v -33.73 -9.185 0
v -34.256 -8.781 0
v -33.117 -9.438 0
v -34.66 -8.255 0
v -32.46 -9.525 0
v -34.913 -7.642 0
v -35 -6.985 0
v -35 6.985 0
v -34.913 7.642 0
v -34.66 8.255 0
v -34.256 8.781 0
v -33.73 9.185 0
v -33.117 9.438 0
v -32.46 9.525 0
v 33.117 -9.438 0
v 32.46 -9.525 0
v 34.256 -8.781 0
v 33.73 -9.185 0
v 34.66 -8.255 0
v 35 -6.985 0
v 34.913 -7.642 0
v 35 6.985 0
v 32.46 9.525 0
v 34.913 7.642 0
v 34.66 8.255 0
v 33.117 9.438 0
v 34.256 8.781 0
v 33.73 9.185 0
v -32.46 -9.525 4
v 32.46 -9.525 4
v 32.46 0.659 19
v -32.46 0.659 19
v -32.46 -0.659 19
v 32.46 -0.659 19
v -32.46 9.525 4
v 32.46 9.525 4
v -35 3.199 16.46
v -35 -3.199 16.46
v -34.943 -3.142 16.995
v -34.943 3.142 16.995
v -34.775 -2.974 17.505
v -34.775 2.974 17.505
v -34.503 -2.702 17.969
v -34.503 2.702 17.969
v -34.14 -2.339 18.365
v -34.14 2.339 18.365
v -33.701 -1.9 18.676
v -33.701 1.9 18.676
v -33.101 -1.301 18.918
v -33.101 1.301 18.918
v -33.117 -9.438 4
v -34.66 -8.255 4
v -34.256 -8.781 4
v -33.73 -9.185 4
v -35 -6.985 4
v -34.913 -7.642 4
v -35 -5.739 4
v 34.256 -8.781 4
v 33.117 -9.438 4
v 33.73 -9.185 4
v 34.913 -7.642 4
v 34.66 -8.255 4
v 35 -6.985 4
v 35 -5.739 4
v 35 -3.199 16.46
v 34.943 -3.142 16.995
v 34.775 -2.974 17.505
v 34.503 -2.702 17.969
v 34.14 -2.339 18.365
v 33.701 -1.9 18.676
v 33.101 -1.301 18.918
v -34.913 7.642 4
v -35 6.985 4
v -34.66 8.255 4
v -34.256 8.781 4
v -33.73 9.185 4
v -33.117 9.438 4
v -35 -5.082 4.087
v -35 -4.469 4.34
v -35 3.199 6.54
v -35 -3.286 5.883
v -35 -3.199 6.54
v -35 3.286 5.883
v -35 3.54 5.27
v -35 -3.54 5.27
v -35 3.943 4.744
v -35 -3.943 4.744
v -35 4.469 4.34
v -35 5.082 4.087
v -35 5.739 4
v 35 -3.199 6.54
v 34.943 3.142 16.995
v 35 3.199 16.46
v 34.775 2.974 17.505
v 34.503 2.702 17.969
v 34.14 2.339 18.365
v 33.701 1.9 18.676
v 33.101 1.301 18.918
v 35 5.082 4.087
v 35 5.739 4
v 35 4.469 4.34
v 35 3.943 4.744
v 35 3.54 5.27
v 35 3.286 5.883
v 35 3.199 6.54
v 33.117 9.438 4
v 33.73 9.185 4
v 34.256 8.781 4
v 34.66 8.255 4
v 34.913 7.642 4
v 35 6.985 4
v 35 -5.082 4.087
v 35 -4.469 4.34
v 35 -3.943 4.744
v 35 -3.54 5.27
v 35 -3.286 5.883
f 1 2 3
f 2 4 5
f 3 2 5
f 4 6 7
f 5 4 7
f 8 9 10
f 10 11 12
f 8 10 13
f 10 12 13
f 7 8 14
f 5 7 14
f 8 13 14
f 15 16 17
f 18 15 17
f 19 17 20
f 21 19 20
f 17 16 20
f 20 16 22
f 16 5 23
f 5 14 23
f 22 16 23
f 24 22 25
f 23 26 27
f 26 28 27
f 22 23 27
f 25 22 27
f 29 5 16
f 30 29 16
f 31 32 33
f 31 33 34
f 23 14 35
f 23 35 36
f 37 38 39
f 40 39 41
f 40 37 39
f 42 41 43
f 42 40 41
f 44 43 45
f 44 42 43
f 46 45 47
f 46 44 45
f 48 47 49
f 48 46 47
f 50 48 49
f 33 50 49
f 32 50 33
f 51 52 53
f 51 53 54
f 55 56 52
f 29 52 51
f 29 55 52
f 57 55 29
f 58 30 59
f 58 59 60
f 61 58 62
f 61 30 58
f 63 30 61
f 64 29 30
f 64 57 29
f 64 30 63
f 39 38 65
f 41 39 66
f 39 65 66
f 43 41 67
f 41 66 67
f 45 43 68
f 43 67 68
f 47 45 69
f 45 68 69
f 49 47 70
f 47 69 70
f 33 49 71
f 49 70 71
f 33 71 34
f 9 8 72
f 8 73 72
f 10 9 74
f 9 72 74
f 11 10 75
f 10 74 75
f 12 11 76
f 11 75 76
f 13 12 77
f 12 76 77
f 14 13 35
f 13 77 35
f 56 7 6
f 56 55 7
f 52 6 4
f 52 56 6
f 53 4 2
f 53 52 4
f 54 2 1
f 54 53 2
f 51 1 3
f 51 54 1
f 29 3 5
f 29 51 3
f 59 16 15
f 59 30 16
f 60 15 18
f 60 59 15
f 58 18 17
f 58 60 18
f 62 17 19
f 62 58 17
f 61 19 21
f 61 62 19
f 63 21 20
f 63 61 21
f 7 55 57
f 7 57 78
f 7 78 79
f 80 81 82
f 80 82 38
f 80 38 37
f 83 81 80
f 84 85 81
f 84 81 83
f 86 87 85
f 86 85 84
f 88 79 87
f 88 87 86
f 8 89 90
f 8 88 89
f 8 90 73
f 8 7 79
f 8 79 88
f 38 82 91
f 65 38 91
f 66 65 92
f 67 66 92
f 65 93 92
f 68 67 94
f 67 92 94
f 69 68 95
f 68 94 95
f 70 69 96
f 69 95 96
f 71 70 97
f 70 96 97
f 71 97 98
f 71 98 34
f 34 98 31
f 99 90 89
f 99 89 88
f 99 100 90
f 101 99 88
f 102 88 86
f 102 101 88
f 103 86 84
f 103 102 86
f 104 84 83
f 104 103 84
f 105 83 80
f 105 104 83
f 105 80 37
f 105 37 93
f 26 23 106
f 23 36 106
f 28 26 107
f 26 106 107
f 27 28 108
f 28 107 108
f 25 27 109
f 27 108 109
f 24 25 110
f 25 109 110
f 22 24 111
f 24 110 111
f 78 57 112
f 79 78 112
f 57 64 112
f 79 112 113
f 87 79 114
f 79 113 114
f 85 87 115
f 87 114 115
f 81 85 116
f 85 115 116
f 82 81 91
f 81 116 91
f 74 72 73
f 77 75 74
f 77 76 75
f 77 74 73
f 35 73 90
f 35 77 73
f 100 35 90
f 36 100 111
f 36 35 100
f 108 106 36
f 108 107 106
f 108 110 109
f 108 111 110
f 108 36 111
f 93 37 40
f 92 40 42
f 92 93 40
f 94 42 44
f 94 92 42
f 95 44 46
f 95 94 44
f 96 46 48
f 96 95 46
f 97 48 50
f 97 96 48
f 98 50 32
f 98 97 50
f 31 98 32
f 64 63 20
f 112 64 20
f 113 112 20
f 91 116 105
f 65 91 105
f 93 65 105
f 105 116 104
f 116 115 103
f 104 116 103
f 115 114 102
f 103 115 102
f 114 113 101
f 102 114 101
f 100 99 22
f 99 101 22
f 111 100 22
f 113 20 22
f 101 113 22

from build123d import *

# Parameters (mm, degrees)
SKETCH1_W           = 70
SKETCH1_H           = 19.05
BOSS_EXTRUDE1_DEPTH = 4
SKETCH2_W           = 70
SKETCH2_H           = 6.398717948
BOSS_EXTRUDE2_DEPTH = 15
FILLET1_R           = 2.54


with BuildPart() as part:
    # Sketch1 → Boss-Extrude1 (new body)
    with BuildSketch(Plane.XY):
        Rectangle(SKETCH1_W, SKETCH1_H)
    extrude(amount=BOSS_EXTRUDE1_DEPTH)

    # Sketch2 → Boss-Extrude2 (add)
    with BuildSketch(Plane.XY.offset(4)):
        Rectangle(SKETCH2_W, SKETCH2_H)
    extrude(amount=BOSS_EXTRUDE2_DEPTH)

    # Fillet1
    fillet1_edges = [part.edges().sort_by_distance(p)[0] for p in [
        (0, 3.199358974, 4),
        (0, -3.199358974, 4),
        (35, 0, 19),
        (0, 3.199358974, 19),
        (-35, 0, 19),
        (0, -3.199358974, 19),
        (35, -9.525, 2),
        (-35, -9.525, 2),
        (-35, 9.525, 2),
        (35, 9.525, 2),
    ]]
    fillet(fillet1_edges, radius=FILLET1_R)


solid = part.part
